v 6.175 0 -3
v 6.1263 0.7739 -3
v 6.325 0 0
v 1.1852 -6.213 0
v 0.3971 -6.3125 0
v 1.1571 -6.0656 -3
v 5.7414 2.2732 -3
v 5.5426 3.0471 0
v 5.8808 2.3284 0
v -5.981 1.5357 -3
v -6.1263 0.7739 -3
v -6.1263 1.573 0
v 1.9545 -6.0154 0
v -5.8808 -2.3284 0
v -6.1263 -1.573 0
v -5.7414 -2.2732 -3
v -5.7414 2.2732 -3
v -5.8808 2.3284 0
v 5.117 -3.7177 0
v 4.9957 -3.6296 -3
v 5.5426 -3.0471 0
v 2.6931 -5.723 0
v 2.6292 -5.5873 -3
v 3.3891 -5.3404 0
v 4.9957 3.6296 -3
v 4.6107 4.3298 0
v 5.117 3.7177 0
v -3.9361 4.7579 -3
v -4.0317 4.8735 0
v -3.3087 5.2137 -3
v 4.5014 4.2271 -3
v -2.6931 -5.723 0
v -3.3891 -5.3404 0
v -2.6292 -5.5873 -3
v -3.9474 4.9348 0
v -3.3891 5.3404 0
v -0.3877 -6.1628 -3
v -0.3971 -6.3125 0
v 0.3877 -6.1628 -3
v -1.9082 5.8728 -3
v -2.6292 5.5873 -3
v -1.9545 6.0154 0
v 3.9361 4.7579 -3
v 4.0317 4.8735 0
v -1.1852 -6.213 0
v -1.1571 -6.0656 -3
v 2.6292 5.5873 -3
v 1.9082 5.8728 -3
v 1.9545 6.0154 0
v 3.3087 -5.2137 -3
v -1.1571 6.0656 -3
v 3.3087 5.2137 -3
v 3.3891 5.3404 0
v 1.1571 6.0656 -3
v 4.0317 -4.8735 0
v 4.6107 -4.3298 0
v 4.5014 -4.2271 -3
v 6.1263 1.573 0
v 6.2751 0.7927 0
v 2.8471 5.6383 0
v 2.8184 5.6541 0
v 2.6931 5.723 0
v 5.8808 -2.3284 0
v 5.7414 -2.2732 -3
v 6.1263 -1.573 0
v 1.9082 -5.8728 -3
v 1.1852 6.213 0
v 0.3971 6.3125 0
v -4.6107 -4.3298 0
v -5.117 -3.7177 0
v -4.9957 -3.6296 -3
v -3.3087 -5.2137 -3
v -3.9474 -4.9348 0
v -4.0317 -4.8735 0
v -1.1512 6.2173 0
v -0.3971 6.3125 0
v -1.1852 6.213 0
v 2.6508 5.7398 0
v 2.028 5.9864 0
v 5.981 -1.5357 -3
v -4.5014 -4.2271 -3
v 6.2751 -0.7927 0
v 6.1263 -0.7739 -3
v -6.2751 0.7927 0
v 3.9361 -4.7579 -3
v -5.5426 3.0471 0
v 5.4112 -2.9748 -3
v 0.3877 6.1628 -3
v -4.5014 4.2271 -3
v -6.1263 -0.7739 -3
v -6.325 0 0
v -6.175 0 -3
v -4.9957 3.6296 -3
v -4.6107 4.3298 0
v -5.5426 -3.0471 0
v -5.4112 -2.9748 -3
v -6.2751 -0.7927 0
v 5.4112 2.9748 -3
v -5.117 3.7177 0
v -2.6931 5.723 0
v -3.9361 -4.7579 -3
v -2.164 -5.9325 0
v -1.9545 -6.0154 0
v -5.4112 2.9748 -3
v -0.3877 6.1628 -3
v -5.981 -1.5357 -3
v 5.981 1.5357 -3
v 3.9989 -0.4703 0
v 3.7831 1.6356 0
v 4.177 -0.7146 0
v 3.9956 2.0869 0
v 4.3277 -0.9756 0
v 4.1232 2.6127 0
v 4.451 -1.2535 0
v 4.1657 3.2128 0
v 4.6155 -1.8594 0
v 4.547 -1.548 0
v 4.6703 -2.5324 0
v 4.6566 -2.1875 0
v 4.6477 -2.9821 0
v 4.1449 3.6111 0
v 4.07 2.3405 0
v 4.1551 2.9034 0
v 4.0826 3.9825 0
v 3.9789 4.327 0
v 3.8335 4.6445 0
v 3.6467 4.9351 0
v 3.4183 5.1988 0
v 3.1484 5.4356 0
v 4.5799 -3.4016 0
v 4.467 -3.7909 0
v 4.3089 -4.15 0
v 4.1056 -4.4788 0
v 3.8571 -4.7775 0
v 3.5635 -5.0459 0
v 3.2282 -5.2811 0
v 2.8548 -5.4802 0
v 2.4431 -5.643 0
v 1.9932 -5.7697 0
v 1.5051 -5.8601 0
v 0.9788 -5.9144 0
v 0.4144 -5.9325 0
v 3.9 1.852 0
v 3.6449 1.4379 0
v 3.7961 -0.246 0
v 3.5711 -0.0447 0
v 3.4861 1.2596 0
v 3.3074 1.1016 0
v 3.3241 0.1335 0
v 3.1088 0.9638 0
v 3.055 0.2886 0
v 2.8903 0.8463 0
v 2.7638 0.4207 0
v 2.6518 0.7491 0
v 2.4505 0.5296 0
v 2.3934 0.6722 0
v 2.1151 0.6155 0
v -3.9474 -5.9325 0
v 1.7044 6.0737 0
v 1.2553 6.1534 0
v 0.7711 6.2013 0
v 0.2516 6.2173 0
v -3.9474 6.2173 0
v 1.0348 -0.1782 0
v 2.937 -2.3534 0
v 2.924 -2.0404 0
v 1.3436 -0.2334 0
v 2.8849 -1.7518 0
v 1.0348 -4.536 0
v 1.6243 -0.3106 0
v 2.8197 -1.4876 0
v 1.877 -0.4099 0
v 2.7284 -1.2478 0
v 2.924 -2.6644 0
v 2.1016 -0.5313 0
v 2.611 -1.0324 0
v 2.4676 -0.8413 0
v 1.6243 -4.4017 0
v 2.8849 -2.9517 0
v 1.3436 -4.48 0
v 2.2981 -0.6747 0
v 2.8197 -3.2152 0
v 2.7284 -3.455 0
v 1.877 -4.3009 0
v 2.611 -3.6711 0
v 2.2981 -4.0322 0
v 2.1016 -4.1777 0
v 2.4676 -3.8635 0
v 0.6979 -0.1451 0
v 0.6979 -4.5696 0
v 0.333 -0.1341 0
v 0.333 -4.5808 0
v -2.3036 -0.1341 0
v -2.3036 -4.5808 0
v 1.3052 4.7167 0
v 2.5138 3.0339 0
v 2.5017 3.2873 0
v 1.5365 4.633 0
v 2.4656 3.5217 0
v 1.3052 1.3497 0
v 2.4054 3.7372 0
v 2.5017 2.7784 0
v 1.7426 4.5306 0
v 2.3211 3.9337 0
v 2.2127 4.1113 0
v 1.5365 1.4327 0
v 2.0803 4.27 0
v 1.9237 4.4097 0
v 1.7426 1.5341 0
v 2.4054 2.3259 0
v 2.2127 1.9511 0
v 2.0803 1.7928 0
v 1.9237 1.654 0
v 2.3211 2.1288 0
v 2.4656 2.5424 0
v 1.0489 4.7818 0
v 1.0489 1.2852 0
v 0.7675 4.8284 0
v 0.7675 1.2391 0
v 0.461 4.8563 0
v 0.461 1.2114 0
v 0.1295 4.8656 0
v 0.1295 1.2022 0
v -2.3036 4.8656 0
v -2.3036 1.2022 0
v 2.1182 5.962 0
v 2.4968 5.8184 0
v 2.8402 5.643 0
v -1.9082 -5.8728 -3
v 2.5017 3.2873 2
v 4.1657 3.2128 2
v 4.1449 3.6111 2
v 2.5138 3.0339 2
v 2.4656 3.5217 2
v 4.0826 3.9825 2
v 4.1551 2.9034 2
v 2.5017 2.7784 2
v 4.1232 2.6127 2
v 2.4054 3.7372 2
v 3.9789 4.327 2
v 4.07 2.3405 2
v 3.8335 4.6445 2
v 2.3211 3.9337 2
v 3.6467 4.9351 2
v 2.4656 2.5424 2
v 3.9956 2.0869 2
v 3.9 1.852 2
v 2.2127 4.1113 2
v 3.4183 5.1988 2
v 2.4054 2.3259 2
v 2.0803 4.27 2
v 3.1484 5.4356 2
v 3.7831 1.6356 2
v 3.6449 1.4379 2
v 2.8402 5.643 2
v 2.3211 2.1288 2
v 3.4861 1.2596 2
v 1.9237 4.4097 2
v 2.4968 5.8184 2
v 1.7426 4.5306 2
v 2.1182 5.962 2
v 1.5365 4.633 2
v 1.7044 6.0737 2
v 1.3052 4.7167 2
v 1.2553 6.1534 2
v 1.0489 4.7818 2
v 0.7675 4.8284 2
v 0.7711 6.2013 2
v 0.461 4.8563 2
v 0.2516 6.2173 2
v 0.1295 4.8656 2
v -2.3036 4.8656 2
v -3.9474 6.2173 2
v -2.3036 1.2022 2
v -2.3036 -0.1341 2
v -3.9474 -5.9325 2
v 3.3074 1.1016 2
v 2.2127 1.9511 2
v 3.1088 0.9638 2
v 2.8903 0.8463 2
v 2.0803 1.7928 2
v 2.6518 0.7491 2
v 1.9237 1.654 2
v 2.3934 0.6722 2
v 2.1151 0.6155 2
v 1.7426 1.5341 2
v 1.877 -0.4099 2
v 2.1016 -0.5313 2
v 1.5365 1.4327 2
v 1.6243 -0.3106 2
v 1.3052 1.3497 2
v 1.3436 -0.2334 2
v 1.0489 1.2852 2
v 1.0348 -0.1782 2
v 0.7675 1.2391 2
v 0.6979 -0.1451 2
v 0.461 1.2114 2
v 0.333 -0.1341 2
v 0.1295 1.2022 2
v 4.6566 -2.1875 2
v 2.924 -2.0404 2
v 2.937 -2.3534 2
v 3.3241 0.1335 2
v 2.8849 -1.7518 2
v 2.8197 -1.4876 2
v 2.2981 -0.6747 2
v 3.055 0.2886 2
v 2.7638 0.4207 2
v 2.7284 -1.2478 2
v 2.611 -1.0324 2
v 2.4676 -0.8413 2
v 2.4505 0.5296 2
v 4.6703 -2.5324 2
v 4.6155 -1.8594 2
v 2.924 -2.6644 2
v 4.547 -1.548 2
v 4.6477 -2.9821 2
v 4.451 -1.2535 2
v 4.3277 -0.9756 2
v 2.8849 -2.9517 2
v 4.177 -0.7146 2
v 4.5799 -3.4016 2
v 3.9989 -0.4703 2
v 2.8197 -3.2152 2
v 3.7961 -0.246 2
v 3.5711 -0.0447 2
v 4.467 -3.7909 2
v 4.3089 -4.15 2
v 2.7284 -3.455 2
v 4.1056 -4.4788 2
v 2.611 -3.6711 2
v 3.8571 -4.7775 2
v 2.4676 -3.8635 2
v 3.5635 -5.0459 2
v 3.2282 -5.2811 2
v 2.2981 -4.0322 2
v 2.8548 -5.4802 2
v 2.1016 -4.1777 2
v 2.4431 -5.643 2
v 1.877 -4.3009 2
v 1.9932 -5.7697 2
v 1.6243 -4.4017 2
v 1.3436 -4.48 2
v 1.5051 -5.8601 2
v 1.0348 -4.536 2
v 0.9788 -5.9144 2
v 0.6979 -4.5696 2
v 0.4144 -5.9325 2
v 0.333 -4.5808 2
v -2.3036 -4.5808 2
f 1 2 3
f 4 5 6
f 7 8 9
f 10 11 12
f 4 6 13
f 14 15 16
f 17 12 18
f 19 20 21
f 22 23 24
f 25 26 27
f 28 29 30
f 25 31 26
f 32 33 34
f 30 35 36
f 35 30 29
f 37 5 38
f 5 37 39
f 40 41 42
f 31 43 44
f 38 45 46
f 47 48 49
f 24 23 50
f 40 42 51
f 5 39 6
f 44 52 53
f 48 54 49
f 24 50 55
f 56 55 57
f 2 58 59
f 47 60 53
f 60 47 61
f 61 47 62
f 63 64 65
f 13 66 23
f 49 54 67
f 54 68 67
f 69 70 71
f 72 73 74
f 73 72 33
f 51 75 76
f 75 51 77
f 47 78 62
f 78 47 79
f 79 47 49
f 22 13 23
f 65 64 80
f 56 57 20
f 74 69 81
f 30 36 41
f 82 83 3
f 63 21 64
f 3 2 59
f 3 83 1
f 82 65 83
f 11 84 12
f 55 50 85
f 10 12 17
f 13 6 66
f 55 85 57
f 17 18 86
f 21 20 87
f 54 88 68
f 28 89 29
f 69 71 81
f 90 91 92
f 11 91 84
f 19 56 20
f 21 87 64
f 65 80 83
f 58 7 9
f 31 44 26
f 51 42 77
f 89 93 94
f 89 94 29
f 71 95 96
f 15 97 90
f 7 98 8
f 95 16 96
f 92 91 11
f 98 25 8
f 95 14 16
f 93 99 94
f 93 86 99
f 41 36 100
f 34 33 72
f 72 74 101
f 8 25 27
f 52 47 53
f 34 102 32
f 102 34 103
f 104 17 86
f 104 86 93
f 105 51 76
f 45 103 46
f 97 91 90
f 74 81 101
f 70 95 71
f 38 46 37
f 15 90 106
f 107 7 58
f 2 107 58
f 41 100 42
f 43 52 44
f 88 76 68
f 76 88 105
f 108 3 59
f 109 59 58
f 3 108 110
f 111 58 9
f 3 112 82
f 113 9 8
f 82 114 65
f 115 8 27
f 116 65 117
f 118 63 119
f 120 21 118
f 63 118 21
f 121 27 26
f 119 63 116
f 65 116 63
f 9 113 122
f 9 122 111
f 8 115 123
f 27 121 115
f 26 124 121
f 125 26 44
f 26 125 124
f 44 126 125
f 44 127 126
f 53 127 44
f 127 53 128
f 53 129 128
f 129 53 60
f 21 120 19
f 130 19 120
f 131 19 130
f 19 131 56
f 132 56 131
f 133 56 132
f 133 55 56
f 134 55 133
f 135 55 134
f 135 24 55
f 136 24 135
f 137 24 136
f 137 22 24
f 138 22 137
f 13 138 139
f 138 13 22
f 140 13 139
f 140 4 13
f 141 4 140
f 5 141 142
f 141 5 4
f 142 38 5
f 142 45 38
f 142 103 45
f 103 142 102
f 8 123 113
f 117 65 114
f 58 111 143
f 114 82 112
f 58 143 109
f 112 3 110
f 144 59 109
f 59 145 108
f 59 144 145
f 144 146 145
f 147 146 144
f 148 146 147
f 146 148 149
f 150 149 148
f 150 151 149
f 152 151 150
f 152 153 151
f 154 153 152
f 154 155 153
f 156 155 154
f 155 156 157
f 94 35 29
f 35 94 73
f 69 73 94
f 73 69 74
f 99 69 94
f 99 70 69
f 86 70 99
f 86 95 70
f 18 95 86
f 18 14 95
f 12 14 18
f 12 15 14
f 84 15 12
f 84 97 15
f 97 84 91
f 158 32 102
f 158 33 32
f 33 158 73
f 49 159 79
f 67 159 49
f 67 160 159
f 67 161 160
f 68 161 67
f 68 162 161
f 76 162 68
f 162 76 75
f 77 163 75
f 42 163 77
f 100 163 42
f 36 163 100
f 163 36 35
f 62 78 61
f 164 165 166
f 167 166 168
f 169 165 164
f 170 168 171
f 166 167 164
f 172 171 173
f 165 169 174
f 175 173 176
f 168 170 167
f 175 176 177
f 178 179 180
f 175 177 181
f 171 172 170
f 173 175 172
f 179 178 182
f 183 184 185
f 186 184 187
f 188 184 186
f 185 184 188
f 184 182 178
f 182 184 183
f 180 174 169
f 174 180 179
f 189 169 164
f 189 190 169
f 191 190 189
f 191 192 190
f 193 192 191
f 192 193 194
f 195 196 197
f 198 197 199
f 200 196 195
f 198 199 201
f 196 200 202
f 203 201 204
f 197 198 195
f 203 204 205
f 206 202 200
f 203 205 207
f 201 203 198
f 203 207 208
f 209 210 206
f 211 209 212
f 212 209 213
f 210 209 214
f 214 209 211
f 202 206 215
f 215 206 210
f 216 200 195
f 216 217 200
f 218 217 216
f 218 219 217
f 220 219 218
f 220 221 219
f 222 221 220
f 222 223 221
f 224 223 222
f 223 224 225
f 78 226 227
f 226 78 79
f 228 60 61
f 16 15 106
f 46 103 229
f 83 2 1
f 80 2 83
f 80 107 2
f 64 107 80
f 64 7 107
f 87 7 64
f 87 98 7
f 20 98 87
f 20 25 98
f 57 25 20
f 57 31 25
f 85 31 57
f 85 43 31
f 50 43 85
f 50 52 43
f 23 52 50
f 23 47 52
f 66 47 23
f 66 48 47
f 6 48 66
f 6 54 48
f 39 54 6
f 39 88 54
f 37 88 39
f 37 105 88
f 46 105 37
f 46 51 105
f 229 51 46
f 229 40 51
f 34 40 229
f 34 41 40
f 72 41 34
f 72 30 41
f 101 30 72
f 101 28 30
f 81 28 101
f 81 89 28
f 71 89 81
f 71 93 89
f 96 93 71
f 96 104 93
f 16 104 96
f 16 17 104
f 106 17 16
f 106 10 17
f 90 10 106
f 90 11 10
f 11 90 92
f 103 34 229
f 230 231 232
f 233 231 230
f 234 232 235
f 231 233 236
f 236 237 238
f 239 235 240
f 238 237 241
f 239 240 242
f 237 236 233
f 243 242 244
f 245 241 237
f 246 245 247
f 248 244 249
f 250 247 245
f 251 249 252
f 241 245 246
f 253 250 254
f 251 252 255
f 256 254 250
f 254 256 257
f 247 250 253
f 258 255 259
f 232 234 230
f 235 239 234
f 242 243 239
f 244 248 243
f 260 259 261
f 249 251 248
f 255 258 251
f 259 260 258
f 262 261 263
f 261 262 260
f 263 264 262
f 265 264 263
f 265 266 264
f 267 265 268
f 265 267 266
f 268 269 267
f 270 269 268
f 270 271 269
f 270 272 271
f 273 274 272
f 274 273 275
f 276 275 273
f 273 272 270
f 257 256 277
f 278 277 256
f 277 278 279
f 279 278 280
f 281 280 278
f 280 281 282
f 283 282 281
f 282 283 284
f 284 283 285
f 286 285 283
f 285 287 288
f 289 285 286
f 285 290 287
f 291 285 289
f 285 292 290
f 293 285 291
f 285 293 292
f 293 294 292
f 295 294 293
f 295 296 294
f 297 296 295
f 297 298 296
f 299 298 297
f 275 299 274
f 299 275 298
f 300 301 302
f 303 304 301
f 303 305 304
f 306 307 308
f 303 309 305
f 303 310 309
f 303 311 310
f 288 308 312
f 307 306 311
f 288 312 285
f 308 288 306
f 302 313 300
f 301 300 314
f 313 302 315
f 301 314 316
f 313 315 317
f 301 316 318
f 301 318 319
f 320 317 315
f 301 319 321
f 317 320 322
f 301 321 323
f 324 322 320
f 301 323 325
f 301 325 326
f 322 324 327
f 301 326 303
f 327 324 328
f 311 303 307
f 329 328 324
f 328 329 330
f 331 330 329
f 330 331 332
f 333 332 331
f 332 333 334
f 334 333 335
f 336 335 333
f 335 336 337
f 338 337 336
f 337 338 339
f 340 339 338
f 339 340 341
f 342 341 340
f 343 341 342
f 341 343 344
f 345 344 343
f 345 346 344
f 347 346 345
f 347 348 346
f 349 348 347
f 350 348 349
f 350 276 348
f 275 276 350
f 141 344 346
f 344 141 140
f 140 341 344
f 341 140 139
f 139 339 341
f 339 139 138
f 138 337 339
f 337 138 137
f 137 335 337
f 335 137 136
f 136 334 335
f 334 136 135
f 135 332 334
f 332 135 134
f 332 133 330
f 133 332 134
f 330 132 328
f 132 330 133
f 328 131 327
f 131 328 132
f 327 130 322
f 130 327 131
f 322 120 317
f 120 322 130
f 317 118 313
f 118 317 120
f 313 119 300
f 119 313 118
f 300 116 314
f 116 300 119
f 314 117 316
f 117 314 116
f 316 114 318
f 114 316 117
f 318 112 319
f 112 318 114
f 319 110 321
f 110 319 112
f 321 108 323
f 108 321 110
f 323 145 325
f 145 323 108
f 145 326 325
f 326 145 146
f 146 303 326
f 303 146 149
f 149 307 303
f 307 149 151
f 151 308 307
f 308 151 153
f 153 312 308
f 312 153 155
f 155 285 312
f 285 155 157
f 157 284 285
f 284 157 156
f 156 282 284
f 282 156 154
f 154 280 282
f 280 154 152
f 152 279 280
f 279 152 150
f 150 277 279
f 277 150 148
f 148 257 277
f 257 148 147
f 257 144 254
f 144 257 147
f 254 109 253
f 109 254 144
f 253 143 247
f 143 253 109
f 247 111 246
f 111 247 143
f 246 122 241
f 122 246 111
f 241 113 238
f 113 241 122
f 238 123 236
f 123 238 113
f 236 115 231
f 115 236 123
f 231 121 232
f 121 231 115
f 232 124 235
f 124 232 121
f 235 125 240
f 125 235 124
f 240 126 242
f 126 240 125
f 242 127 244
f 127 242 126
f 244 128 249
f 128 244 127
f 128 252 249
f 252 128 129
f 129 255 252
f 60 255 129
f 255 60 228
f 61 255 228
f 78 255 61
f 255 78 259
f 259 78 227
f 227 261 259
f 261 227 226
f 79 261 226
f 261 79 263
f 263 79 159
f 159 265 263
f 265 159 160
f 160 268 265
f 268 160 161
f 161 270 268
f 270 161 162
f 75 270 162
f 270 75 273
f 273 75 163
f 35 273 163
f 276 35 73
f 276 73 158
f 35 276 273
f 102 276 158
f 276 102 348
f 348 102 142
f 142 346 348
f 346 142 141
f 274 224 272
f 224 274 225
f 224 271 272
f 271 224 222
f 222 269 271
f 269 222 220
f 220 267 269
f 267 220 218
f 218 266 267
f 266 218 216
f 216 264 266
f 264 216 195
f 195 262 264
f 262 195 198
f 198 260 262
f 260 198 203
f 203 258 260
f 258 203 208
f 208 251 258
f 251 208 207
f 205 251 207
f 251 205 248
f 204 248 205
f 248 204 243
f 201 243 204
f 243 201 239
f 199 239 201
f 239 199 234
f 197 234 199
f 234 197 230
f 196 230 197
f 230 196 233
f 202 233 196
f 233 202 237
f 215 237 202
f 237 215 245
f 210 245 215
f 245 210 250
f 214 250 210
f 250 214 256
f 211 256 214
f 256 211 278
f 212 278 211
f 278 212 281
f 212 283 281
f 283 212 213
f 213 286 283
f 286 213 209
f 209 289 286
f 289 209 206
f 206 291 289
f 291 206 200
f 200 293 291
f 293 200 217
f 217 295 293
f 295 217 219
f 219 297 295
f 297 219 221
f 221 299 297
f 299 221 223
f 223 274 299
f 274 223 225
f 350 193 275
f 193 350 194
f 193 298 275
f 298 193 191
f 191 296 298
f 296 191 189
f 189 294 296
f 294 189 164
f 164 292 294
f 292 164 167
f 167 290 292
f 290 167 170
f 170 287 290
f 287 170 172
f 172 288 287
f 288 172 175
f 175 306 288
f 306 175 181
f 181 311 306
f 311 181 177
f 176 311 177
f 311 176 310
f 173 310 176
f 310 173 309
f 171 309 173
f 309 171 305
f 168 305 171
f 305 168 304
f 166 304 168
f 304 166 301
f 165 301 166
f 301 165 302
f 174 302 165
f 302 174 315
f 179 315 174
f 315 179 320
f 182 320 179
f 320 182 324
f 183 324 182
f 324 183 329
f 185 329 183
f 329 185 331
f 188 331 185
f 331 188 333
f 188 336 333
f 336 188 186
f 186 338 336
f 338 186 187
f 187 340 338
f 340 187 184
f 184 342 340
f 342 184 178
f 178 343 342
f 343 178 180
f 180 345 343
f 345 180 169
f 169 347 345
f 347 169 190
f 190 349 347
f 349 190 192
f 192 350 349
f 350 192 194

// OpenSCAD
$fn = 50;


difference() {
	union() {
		translate(v = [0, 0, -3.0000000000]) {
			cylinder(h = 3, r1 = 6.1750000000, r2 = 6.3250000000);
		}
		linear_extrude(height = 2) {
			text(font = "Impact", halign = "center", size = 12, text = "B", valign = "center");
		}
	}
	union();
}
